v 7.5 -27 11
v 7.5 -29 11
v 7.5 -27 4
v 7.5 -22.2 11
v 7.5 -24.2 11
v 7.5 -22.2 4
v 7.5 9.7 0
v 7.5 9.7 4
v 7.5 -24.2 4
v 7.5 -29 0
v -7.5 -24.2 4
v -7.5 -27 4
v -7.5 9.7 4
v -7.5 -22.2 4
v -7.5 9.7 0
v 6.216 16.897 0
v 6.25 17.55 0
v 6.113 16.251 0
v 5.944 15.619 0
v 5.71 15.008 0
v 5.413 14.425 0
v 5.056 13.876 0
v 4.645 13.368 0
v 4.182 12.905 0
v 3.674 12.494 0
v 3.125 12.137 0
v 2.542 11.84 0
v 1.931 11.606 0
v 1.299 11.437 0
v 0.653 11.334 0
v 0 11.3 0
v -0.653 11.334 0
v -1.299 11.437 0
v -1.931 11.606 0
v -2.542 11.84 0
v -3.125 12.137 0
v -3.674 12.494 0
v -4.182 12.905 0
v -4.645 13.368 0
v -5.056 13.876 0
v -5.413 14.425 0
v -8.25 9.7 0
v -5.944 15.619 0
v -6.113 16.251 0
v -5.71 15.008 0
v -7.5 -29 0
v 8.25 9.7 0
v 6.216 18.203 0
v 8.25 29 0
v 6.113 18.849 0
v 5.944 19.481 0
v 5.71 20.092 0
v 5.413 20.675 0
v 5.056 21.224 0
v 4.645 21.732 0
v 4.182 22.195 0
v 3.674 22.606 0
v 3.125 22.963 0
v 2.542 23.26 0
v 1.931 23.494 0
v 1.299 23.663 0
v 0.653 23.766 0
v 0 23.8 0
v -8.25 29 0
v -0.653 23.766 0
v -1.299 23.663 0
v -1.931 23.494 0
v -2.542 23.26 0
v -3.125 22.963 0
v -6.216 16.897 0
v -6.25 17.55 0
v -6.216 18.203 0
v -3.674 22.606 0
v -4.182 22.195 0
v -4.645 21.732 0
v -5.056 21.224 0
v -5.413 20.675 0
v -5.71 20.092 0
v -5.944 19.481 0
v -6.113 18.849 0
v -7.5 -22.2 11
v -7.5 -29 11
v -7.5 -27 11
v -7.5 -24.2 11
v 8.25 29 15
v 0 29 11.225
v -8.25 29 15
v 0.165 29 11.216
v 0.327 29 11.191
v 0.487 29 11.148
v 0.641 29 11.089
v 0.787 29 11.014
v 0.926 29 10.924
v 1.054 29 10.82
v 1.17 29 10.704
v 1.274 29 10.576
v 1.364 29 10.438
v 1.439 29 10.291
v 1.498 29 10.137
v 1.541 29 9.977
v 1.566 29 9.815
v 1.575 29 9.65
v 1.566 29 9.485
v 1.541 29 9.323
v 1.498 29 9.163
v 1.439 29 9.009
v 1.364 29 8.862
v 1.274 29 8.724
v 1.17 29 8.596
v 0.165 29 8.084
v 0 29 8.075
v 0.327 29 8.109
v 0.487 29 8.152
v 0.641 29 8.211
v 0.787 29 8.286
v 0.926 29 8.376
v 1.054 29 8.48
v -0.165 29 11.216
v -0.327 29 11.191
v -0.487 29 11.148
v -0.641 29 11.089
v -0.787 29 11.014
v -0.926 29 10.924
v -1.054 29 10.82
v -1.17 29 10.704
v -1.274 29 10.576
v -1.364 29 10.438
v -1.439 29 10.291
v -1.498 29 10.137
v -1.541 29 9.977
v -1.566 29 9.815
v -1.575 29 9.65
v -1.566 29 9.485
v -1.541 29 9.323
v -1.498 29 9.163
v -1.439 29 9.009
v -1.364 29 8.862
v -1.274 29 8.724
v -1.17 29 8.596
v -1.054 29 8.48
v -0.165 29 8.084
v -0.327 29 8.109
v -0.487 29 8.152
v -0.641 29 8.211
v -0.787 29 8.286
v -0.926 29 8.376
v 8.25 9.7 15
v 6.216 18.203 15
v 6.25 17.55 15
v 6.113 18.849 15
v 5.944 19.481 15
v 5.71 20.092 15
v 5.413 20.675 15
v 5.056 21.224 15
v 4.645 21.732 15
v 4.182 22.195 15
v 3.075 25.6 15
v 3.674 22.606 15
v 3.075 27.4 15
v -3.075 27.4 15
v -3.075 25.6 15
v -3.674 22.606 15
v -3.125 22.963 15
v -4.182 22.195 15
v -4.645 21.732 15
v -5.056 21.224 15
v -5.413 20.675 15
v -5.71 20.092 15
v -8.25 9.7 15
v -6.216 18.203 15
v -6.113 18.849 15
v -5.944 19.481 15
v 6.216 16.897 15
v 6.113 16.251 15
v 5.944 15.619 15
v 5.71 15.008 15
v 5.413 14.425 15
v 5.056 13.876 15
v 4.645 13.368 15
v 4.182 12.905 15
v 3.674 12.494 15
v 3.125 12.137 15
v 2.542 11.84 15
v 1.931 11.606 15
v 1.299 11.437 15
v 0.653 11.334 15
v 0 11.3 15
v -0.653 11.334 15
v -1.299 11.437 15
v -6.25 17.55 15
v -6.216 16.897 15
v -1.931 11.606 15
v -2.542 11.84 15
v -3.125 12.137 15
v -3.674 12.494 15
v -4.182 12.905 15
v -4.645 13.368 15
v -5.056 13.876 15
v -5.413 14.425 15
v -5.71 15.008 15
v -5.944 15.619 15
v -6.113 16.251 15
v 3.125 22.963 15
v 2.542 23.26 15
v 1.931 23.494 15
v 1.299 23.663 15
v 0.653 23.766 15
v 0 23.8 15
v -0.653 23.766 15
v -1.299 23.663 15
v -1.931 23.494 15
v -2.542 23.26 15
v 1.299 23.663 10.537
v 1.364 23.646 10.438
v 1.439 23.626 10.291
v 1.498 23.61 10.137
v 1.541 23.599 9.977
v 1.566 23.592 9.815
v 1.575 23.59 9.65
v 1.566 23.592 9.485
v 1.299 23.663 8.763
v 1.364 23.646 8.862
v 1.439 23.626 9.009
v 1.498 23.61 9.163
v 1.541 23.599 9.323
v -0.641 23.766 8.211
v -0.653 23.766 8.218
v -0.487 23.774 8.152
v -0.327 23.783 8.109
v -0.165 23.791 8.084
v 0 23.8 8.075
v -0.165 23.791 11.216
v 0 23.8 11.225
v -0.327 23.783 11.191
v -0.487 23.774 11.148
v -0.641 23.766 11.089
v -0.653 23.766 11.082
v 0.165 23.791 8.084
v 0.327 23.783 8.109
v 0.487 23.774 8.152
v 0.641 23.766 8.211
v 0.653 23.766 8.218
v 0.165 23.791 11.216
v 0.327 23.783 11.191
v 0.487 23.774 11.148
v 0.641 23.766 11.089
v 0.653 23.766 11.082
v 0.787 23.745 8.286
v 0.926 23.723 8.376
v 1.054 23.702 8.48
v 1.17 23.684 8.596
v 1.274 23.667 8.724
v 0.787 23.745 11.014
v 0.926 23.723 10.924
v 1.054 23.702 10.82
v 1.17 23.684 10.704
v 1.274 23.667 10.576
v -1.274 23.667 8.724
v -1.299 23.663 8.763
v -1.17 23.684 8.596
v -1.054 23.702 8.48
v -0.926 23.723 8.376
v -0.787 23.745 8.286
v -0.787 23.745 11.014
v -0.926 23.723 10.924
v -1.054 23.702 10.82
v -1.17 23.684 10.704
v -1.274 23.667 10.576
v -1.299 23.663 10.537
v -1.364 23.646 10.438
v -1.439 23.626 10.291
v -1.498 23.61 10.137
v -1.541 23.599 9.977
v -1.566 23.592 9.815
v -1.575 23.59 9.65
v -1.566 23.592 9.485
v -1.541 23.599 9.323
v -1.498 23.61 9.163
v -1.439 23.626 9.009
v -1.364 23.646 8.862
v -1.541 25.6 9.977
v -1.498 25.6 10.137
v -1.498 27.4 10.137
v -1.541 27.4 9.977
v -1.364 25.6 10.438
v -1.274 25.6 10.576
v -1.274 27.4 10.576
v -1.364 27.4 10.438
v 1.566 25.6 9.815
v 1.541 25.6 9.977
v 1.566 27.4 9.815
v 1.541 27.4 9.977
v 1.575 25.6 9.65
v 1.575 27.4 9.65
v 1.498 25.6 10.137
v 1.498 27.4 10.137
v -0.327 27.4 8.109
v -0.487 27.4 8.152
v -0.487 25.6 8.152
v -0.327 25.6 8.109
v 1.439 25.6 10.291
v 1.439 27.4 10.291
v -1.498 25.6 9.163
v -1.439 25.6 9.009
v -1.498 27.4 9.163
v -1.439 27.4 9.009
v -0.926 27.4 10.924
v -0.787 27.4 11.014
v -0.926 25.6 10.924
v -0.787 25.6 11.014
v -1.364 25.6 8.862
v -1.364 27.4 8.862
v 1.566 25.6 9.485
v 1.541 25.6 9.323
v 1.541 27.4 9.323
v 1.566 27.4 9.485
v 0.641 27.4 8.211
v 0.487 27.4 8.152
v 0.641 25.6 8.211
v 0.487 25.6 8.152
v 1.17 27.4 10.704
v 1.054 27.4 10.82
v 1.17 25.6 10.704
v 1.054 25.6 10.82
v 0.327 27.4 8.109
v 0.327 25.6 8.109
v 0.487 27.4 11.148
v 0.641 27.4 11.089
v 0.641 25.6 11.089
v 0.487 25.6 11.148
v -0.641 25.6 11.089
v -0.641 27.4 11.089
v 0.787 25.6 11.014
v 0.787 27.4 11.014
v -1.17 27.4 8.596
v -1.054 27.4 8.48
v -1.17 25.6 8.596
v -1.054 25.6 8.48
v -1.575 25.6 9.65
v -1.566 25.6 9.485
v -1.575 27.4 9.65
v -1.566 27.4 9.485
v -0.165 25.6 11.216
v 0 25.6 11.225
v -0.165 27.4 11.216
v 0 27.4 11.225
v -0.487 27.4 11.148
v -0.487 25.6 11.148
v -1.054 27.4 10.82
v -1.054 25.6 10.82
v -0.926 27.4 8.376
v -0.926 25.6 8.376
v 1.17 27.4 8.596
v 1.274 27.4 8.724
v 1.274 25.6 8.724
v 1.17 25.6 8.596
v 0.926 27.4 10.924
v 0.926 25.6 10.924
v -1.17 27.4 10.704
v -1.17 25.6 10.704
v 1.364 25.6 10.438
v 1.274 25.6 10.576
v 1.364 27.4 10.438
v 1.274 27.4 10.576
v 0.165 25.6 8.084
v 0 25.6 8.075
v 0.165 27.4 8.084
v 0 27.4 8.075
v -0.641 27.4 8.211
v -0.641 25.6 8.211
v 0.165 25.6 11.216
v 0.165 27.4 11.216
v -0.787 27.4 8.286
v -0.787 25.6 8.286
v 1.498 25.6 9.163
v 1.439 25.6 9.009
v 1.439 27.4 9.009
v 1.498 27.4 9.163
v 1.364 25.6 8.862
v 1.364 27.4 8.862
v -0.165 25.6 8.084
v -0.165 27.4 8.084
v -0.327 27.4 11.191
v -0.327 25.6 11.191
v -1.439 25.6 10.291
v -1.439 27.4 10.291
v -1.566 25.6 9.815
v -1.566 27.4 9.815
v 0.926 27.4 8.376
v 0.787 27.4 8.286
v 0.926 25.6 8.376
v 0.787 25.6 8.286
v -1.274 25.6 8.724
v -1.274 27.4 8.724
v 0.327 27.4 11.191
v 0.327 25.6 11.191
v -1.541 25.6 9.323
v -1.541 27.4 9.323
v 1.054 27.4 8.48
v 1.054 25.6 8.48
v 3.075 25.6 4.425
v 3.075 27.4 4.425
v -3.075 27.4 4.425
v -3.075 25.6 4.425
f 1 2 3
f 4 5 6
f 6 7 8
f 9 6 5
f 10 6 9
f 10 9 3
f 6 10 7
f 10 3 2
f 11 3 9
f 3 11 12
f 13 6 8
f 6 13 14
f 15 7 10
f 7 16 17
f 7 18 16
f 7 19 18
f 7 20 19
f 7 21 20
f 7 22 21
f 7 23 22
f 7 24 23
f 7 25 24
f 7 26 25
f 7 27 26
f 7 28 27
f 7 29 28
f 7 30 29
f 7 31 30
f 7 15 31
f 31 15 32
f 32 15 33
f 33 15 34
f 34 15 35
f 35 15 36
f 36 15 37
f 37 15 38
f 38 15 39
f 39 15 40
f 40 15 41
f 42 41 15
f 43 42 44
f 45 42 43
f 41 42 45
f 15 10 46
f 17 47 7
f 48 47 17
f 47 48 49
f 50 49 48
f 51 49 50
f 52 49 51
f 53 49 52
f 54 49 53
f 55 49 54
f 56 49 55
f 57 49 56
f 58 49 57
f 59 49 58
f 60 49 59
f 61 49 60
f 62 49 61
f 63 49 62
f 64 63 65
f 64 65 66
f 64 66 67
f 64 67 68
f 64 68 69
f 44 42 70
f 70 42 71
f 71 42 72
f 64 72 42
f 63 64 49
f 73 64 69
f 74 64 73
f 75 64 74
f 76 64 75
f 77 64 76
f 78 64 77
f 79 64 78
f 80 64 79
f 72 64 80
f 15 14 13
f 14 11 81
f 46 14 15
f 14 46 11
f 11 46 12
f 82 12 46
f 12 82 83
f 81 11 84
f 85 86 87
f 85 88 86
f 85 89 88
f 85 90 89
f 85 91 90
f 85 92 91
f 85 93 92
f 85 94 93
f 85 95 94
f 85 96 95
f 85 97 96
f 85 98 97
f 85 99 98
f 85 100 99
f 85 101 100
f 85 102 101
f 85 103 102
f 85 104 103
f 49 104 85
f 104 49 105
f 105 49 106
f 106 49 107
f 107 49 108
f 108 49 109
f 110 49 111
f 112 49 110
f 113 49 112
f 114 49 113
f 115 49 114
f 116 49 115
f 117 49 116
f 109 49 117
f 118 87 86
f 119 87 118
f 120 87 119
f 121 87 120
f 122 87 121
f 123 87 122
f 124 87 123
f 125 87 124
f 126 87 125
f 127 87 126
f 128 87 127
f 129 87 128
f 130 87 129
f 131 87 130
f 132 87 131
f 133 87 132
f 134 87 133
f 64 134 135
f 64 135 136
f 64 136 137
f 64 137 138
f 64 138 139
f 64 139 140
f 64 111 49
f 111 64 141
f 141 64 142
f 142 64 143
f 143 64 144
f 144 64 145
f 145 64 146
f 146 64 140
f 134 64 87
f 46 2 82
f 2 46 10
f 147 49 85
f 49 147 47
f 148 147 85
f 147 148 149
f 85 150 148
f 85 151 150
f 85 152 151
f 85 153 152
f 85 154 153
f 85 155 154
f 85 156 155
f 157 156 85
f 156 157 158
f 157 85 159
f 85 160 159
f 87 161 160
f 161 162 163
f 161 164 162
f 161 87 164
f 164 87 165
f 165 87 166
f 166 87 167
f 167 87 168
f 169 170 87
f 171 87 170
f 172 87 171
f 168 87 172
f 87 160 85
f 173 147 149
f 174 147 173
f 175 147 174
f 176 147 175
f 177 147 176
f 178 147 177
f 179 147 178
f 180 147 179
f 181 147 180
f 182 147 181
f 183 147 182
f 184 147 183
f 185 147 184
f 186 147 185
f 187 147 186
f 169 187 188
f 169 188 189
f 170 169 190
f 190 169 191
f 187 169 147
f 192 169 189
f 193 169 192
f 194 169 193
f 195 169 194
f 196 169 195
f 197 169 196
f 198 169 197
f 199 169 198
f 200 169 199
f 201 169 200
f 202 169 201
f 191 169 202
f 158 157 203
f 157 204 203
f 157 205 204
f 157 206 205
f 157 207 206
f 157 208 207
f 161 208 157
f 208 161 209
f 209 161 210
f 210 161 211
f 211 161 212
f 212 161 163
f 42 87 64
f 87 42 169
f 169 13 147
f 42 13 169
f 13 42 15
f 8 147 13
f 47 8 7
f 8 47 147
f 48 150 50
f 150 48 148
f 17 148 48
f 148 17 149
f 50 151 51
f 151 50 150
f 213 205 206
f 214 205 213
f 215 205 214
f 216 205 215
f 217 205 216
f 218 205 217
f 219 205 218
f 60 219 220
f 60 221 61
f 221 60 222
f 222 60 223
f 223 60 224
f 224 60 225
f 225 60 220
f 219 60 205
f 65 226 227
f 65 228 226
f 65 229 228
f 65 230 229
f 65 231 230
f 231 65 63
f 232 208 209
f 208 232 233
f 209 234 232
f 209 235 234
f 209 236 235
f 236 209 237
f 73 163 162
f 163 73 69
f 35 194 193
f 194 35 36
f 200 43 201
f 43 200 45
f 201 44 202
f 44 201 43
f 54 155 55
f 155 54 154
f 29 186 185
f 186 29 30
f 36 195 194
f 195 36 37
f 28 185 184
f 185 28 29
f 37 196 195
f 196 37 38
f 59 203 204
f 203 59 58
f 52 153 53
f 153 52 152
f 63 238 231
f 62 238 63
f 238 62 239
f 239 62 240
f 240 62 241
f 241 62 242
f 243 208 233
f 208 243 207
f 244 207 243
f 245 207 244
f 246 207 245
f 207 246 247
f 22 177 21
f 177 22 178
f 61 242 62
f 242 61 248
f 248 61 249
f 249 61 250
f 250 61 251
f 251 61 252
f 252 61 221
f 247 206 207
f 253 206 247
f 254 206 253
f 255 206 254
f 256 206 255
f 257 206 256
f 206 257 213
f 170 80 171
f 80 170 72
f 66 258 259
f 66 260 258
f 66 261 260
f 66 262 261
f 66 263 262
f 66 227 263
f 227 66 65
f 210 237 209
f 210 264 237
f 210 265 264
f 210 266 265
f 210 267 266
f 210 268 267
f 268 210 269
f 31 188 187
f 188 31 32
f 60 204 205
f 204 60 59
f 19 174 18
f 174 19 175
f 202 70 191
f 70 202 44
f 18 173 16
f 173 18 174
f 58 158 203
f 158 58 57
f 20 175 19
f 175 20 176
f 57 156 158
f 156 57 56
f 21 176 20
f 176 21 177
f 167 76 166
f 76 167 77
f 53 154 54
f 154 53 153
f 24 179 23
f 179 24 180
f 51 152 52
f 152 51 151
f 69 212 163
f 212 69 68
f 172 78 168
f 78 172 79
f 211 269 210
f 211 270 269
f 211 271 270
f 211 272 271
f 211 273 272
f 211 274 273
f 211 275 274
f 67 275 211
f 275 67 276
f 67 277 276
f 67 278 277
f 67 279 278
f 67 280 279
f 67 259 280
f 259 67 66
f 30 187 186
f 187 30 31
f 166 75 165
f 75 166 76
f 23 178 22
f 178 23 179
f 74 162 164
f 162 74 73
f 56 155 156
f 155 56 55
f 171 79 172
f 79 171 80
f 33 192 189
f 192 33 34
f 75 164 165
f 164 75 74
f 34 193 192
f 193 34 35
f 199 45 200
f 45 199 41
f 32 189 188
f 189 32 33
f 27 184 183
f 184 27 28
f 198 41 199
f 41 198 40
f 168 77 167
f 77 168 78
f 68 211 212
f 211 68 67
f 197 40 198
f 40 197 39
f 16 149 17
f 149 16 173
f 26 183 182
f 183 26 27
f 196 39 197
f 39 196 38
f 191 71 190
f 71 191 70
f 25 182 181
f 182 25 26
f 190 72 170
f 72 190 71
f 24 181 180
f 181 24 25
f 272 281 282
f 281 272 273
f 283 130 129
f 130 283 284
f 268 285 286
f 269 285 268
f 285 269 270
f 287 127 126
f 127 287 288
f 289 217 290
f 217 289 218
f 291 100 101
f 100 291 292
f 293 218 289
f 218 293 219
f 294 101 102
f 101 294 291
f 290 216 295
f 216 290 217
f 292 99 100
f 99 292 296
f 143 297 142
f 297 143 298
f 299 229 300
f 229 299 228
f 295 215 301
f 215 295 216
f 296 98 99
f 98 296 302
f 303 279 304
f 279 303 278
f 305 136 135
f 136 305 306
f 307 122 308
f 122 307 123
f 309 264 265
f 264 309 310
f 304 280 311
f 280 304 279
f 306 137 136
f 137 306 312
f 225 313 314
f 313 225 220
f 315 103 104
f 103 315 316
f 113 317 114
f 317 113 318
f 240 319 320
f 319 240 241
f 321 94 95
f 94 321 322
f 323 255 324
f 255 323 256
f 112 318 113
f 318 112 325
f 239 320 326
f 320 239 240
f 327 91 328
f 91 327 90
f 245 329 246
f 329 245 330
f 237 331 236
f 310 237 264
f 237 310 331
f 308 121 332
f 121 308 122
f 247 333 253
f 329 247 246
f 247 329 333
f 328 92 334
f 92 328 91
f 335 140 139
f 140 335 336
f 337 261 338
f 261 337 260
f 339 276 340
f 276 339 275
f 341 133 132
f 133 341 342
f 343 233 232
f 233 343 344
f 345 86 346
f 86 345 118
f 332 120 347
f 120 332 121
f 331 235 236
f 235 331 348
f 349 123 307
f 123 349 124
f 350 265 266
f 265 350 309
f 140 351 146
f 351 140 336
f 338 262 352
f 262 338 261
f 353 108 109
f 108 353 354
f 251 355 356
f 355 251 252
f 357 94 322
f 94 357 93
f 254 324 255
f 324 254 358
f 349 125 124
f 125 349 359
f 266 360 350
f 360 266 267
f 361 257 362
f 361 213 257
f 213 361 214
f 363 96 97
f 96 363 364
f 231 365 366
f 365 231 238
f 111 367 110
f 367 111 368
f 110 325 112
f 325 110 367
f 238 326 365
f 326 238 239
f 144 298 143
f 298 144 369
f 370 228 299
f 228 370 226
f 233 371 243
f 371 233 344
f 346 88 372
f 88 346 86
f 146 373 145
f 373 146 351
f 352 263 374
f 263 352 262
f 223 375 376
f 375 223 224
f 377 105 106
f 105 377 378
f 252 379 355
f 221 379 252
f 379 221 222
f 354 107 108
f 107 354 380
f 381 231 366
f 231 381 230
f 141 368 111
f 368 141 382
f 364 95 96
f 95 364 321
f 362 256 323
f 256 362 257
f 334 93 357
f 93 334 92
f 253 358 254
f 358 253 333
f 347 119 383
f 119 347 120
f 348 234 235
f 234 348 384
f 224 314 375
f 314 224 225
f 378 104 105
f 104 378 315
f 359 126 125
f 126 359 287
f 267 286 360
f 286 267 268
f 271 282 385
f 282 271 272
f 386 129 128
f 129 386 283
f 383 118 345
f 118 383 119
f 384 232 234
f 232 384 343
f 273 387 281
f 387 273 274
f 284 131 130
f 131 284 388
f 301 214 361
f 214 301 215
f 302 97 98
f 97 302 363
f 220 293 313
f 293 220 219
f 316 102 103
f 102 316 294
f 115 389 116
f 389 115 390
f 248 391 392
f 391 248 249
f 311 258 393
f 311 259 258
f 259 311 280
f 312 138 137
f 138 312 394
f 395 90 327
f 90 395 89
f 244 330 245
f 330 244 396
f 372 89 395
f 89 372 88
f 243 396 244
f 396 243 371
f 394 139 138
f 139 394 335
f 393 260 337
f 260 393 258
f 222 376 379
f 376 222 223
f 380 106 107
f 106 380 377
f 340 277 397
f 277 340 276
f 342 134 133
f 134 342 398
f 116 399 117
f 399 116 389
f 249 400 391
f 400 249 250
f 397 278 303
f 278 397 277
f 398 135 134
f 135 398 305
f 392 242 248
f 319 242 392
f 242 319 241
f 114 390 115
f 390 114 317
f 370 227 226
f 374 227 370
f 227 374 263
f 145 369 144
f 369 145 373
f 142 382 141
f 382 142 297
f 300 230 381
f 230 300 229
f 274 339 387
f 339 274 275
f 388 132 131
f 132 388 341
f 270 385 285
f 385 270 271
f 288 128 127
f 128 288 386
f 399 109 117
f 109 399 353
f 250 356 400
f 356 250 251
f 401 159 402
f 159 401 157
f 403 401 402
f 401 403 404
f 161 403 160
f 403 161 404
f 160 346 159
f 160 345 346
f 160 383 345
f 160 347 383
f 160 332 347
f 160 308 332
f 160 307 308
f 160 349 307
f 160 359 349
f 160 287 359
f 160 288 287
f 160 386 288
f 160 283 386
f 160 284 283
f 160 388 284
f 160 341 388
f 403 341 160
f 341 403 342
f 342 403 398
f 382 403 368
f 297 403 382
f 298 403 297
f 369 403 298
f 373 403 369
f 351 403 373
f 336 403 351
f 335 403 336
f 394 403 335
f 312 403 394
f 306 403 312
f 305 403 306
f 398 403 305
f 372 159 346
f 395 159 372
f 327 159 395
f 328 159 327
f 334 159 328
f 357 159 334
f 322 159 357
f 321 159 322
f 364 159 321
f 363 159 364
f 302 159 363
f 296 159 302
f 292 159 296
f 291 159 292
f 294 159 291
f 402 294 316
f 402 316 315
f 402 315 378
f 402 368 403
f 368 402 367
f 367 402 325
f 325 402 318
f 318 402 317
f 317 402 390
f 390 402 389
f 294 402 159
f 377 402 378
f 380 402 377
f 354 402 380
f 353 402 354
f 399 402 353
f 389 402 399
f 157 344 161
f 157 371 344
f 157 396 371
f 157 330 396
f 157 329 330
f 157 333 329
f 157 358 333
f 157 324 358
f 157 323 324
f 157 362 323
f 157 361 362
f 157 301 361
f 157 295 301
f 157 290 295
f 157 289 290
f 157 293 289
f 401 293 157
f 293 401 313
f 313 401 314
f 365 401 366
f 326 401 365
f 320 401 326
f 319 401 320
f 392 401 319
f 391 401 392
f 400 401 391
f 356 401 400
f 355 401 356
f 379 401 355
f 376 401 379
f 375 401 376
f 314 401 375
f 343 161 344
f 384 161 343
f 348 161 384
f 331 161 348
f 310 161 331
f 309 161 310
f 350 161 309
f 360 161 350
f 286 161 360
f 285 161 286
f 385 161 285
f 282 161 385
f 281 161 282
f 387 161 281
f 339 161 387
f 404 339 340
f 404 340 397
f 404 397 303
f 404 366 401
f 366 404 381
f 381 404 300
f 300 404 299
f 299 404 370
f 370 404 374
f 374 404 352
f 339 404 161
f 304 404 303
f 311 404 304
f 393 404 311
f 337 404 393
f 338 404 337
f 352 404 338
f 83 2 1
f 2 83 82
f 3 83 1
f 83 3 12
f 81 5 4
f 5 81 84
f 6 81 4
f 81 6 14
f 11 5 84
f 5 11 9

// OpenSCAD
include <MCAD/units.scad>

$fn = 60;

width = 15;
length = 58;
thickness = 4;
groove = 2.8;
wall_height = 7;
wall_thickness = 2;

tolerance = 0.15;

tool_diameter = 11.5;
tool_tolerance = 1;
nut_trap_thickness = 1.8;
tool_holder_padding = 2.5;
tool_holder_length = tool_diameter + tool_tolerance + nut_trap_thickness + tool_holder_padding * 2;
tool_holder_height = 15;
nut_trap_diameter = 6;

difference() {
    union() {
        translate([-width/2, -length/2])
        cube([width, length, thickness]);
        
        translate([-tool_diameter/2-tool_holder_padding, length / 2 - tool_holder_length, 0])
        cube([tool_diameter + 2 * tool_holder_padding, tool_holder_length, tool_holder_height]);
    }
    
    translate([0, length / 2 - nut_trap_thickness - tool_holder_length / 2, -epsilon / 2])
    cylinder(h=tool_holder_height + epsilon, r=(tool_diameter + tool_tolerance) / 2);
    
    translate([0, length / 2 + epsilon, tool_holder_length / 2])
    rotate([90, 0, 0])
    cylinder(r=(M3 + tolerance)/2, h=tool_holder_length / 2);
    
    // nut trap
    translate([-(nut_trap_diameter + tolerance) / 2, length / 2 - nut_trap_thickness - (tool_holder_padding - nut_trap_thickness / 2), tool_holder_height / 2 - (nut_trap_diameter + tolerance) / 2])
    cube([6 + tolerance, nut_trap_thickness, tool_holder_height]);
}

translate([-width/2, -length/2, thickness])
cube([width, wall_thickness, wall_height]);

translate([-width/2, -length/2 + groove + wall_thickness, thickness])
cube([width, wall_thickness, wall_height]);
